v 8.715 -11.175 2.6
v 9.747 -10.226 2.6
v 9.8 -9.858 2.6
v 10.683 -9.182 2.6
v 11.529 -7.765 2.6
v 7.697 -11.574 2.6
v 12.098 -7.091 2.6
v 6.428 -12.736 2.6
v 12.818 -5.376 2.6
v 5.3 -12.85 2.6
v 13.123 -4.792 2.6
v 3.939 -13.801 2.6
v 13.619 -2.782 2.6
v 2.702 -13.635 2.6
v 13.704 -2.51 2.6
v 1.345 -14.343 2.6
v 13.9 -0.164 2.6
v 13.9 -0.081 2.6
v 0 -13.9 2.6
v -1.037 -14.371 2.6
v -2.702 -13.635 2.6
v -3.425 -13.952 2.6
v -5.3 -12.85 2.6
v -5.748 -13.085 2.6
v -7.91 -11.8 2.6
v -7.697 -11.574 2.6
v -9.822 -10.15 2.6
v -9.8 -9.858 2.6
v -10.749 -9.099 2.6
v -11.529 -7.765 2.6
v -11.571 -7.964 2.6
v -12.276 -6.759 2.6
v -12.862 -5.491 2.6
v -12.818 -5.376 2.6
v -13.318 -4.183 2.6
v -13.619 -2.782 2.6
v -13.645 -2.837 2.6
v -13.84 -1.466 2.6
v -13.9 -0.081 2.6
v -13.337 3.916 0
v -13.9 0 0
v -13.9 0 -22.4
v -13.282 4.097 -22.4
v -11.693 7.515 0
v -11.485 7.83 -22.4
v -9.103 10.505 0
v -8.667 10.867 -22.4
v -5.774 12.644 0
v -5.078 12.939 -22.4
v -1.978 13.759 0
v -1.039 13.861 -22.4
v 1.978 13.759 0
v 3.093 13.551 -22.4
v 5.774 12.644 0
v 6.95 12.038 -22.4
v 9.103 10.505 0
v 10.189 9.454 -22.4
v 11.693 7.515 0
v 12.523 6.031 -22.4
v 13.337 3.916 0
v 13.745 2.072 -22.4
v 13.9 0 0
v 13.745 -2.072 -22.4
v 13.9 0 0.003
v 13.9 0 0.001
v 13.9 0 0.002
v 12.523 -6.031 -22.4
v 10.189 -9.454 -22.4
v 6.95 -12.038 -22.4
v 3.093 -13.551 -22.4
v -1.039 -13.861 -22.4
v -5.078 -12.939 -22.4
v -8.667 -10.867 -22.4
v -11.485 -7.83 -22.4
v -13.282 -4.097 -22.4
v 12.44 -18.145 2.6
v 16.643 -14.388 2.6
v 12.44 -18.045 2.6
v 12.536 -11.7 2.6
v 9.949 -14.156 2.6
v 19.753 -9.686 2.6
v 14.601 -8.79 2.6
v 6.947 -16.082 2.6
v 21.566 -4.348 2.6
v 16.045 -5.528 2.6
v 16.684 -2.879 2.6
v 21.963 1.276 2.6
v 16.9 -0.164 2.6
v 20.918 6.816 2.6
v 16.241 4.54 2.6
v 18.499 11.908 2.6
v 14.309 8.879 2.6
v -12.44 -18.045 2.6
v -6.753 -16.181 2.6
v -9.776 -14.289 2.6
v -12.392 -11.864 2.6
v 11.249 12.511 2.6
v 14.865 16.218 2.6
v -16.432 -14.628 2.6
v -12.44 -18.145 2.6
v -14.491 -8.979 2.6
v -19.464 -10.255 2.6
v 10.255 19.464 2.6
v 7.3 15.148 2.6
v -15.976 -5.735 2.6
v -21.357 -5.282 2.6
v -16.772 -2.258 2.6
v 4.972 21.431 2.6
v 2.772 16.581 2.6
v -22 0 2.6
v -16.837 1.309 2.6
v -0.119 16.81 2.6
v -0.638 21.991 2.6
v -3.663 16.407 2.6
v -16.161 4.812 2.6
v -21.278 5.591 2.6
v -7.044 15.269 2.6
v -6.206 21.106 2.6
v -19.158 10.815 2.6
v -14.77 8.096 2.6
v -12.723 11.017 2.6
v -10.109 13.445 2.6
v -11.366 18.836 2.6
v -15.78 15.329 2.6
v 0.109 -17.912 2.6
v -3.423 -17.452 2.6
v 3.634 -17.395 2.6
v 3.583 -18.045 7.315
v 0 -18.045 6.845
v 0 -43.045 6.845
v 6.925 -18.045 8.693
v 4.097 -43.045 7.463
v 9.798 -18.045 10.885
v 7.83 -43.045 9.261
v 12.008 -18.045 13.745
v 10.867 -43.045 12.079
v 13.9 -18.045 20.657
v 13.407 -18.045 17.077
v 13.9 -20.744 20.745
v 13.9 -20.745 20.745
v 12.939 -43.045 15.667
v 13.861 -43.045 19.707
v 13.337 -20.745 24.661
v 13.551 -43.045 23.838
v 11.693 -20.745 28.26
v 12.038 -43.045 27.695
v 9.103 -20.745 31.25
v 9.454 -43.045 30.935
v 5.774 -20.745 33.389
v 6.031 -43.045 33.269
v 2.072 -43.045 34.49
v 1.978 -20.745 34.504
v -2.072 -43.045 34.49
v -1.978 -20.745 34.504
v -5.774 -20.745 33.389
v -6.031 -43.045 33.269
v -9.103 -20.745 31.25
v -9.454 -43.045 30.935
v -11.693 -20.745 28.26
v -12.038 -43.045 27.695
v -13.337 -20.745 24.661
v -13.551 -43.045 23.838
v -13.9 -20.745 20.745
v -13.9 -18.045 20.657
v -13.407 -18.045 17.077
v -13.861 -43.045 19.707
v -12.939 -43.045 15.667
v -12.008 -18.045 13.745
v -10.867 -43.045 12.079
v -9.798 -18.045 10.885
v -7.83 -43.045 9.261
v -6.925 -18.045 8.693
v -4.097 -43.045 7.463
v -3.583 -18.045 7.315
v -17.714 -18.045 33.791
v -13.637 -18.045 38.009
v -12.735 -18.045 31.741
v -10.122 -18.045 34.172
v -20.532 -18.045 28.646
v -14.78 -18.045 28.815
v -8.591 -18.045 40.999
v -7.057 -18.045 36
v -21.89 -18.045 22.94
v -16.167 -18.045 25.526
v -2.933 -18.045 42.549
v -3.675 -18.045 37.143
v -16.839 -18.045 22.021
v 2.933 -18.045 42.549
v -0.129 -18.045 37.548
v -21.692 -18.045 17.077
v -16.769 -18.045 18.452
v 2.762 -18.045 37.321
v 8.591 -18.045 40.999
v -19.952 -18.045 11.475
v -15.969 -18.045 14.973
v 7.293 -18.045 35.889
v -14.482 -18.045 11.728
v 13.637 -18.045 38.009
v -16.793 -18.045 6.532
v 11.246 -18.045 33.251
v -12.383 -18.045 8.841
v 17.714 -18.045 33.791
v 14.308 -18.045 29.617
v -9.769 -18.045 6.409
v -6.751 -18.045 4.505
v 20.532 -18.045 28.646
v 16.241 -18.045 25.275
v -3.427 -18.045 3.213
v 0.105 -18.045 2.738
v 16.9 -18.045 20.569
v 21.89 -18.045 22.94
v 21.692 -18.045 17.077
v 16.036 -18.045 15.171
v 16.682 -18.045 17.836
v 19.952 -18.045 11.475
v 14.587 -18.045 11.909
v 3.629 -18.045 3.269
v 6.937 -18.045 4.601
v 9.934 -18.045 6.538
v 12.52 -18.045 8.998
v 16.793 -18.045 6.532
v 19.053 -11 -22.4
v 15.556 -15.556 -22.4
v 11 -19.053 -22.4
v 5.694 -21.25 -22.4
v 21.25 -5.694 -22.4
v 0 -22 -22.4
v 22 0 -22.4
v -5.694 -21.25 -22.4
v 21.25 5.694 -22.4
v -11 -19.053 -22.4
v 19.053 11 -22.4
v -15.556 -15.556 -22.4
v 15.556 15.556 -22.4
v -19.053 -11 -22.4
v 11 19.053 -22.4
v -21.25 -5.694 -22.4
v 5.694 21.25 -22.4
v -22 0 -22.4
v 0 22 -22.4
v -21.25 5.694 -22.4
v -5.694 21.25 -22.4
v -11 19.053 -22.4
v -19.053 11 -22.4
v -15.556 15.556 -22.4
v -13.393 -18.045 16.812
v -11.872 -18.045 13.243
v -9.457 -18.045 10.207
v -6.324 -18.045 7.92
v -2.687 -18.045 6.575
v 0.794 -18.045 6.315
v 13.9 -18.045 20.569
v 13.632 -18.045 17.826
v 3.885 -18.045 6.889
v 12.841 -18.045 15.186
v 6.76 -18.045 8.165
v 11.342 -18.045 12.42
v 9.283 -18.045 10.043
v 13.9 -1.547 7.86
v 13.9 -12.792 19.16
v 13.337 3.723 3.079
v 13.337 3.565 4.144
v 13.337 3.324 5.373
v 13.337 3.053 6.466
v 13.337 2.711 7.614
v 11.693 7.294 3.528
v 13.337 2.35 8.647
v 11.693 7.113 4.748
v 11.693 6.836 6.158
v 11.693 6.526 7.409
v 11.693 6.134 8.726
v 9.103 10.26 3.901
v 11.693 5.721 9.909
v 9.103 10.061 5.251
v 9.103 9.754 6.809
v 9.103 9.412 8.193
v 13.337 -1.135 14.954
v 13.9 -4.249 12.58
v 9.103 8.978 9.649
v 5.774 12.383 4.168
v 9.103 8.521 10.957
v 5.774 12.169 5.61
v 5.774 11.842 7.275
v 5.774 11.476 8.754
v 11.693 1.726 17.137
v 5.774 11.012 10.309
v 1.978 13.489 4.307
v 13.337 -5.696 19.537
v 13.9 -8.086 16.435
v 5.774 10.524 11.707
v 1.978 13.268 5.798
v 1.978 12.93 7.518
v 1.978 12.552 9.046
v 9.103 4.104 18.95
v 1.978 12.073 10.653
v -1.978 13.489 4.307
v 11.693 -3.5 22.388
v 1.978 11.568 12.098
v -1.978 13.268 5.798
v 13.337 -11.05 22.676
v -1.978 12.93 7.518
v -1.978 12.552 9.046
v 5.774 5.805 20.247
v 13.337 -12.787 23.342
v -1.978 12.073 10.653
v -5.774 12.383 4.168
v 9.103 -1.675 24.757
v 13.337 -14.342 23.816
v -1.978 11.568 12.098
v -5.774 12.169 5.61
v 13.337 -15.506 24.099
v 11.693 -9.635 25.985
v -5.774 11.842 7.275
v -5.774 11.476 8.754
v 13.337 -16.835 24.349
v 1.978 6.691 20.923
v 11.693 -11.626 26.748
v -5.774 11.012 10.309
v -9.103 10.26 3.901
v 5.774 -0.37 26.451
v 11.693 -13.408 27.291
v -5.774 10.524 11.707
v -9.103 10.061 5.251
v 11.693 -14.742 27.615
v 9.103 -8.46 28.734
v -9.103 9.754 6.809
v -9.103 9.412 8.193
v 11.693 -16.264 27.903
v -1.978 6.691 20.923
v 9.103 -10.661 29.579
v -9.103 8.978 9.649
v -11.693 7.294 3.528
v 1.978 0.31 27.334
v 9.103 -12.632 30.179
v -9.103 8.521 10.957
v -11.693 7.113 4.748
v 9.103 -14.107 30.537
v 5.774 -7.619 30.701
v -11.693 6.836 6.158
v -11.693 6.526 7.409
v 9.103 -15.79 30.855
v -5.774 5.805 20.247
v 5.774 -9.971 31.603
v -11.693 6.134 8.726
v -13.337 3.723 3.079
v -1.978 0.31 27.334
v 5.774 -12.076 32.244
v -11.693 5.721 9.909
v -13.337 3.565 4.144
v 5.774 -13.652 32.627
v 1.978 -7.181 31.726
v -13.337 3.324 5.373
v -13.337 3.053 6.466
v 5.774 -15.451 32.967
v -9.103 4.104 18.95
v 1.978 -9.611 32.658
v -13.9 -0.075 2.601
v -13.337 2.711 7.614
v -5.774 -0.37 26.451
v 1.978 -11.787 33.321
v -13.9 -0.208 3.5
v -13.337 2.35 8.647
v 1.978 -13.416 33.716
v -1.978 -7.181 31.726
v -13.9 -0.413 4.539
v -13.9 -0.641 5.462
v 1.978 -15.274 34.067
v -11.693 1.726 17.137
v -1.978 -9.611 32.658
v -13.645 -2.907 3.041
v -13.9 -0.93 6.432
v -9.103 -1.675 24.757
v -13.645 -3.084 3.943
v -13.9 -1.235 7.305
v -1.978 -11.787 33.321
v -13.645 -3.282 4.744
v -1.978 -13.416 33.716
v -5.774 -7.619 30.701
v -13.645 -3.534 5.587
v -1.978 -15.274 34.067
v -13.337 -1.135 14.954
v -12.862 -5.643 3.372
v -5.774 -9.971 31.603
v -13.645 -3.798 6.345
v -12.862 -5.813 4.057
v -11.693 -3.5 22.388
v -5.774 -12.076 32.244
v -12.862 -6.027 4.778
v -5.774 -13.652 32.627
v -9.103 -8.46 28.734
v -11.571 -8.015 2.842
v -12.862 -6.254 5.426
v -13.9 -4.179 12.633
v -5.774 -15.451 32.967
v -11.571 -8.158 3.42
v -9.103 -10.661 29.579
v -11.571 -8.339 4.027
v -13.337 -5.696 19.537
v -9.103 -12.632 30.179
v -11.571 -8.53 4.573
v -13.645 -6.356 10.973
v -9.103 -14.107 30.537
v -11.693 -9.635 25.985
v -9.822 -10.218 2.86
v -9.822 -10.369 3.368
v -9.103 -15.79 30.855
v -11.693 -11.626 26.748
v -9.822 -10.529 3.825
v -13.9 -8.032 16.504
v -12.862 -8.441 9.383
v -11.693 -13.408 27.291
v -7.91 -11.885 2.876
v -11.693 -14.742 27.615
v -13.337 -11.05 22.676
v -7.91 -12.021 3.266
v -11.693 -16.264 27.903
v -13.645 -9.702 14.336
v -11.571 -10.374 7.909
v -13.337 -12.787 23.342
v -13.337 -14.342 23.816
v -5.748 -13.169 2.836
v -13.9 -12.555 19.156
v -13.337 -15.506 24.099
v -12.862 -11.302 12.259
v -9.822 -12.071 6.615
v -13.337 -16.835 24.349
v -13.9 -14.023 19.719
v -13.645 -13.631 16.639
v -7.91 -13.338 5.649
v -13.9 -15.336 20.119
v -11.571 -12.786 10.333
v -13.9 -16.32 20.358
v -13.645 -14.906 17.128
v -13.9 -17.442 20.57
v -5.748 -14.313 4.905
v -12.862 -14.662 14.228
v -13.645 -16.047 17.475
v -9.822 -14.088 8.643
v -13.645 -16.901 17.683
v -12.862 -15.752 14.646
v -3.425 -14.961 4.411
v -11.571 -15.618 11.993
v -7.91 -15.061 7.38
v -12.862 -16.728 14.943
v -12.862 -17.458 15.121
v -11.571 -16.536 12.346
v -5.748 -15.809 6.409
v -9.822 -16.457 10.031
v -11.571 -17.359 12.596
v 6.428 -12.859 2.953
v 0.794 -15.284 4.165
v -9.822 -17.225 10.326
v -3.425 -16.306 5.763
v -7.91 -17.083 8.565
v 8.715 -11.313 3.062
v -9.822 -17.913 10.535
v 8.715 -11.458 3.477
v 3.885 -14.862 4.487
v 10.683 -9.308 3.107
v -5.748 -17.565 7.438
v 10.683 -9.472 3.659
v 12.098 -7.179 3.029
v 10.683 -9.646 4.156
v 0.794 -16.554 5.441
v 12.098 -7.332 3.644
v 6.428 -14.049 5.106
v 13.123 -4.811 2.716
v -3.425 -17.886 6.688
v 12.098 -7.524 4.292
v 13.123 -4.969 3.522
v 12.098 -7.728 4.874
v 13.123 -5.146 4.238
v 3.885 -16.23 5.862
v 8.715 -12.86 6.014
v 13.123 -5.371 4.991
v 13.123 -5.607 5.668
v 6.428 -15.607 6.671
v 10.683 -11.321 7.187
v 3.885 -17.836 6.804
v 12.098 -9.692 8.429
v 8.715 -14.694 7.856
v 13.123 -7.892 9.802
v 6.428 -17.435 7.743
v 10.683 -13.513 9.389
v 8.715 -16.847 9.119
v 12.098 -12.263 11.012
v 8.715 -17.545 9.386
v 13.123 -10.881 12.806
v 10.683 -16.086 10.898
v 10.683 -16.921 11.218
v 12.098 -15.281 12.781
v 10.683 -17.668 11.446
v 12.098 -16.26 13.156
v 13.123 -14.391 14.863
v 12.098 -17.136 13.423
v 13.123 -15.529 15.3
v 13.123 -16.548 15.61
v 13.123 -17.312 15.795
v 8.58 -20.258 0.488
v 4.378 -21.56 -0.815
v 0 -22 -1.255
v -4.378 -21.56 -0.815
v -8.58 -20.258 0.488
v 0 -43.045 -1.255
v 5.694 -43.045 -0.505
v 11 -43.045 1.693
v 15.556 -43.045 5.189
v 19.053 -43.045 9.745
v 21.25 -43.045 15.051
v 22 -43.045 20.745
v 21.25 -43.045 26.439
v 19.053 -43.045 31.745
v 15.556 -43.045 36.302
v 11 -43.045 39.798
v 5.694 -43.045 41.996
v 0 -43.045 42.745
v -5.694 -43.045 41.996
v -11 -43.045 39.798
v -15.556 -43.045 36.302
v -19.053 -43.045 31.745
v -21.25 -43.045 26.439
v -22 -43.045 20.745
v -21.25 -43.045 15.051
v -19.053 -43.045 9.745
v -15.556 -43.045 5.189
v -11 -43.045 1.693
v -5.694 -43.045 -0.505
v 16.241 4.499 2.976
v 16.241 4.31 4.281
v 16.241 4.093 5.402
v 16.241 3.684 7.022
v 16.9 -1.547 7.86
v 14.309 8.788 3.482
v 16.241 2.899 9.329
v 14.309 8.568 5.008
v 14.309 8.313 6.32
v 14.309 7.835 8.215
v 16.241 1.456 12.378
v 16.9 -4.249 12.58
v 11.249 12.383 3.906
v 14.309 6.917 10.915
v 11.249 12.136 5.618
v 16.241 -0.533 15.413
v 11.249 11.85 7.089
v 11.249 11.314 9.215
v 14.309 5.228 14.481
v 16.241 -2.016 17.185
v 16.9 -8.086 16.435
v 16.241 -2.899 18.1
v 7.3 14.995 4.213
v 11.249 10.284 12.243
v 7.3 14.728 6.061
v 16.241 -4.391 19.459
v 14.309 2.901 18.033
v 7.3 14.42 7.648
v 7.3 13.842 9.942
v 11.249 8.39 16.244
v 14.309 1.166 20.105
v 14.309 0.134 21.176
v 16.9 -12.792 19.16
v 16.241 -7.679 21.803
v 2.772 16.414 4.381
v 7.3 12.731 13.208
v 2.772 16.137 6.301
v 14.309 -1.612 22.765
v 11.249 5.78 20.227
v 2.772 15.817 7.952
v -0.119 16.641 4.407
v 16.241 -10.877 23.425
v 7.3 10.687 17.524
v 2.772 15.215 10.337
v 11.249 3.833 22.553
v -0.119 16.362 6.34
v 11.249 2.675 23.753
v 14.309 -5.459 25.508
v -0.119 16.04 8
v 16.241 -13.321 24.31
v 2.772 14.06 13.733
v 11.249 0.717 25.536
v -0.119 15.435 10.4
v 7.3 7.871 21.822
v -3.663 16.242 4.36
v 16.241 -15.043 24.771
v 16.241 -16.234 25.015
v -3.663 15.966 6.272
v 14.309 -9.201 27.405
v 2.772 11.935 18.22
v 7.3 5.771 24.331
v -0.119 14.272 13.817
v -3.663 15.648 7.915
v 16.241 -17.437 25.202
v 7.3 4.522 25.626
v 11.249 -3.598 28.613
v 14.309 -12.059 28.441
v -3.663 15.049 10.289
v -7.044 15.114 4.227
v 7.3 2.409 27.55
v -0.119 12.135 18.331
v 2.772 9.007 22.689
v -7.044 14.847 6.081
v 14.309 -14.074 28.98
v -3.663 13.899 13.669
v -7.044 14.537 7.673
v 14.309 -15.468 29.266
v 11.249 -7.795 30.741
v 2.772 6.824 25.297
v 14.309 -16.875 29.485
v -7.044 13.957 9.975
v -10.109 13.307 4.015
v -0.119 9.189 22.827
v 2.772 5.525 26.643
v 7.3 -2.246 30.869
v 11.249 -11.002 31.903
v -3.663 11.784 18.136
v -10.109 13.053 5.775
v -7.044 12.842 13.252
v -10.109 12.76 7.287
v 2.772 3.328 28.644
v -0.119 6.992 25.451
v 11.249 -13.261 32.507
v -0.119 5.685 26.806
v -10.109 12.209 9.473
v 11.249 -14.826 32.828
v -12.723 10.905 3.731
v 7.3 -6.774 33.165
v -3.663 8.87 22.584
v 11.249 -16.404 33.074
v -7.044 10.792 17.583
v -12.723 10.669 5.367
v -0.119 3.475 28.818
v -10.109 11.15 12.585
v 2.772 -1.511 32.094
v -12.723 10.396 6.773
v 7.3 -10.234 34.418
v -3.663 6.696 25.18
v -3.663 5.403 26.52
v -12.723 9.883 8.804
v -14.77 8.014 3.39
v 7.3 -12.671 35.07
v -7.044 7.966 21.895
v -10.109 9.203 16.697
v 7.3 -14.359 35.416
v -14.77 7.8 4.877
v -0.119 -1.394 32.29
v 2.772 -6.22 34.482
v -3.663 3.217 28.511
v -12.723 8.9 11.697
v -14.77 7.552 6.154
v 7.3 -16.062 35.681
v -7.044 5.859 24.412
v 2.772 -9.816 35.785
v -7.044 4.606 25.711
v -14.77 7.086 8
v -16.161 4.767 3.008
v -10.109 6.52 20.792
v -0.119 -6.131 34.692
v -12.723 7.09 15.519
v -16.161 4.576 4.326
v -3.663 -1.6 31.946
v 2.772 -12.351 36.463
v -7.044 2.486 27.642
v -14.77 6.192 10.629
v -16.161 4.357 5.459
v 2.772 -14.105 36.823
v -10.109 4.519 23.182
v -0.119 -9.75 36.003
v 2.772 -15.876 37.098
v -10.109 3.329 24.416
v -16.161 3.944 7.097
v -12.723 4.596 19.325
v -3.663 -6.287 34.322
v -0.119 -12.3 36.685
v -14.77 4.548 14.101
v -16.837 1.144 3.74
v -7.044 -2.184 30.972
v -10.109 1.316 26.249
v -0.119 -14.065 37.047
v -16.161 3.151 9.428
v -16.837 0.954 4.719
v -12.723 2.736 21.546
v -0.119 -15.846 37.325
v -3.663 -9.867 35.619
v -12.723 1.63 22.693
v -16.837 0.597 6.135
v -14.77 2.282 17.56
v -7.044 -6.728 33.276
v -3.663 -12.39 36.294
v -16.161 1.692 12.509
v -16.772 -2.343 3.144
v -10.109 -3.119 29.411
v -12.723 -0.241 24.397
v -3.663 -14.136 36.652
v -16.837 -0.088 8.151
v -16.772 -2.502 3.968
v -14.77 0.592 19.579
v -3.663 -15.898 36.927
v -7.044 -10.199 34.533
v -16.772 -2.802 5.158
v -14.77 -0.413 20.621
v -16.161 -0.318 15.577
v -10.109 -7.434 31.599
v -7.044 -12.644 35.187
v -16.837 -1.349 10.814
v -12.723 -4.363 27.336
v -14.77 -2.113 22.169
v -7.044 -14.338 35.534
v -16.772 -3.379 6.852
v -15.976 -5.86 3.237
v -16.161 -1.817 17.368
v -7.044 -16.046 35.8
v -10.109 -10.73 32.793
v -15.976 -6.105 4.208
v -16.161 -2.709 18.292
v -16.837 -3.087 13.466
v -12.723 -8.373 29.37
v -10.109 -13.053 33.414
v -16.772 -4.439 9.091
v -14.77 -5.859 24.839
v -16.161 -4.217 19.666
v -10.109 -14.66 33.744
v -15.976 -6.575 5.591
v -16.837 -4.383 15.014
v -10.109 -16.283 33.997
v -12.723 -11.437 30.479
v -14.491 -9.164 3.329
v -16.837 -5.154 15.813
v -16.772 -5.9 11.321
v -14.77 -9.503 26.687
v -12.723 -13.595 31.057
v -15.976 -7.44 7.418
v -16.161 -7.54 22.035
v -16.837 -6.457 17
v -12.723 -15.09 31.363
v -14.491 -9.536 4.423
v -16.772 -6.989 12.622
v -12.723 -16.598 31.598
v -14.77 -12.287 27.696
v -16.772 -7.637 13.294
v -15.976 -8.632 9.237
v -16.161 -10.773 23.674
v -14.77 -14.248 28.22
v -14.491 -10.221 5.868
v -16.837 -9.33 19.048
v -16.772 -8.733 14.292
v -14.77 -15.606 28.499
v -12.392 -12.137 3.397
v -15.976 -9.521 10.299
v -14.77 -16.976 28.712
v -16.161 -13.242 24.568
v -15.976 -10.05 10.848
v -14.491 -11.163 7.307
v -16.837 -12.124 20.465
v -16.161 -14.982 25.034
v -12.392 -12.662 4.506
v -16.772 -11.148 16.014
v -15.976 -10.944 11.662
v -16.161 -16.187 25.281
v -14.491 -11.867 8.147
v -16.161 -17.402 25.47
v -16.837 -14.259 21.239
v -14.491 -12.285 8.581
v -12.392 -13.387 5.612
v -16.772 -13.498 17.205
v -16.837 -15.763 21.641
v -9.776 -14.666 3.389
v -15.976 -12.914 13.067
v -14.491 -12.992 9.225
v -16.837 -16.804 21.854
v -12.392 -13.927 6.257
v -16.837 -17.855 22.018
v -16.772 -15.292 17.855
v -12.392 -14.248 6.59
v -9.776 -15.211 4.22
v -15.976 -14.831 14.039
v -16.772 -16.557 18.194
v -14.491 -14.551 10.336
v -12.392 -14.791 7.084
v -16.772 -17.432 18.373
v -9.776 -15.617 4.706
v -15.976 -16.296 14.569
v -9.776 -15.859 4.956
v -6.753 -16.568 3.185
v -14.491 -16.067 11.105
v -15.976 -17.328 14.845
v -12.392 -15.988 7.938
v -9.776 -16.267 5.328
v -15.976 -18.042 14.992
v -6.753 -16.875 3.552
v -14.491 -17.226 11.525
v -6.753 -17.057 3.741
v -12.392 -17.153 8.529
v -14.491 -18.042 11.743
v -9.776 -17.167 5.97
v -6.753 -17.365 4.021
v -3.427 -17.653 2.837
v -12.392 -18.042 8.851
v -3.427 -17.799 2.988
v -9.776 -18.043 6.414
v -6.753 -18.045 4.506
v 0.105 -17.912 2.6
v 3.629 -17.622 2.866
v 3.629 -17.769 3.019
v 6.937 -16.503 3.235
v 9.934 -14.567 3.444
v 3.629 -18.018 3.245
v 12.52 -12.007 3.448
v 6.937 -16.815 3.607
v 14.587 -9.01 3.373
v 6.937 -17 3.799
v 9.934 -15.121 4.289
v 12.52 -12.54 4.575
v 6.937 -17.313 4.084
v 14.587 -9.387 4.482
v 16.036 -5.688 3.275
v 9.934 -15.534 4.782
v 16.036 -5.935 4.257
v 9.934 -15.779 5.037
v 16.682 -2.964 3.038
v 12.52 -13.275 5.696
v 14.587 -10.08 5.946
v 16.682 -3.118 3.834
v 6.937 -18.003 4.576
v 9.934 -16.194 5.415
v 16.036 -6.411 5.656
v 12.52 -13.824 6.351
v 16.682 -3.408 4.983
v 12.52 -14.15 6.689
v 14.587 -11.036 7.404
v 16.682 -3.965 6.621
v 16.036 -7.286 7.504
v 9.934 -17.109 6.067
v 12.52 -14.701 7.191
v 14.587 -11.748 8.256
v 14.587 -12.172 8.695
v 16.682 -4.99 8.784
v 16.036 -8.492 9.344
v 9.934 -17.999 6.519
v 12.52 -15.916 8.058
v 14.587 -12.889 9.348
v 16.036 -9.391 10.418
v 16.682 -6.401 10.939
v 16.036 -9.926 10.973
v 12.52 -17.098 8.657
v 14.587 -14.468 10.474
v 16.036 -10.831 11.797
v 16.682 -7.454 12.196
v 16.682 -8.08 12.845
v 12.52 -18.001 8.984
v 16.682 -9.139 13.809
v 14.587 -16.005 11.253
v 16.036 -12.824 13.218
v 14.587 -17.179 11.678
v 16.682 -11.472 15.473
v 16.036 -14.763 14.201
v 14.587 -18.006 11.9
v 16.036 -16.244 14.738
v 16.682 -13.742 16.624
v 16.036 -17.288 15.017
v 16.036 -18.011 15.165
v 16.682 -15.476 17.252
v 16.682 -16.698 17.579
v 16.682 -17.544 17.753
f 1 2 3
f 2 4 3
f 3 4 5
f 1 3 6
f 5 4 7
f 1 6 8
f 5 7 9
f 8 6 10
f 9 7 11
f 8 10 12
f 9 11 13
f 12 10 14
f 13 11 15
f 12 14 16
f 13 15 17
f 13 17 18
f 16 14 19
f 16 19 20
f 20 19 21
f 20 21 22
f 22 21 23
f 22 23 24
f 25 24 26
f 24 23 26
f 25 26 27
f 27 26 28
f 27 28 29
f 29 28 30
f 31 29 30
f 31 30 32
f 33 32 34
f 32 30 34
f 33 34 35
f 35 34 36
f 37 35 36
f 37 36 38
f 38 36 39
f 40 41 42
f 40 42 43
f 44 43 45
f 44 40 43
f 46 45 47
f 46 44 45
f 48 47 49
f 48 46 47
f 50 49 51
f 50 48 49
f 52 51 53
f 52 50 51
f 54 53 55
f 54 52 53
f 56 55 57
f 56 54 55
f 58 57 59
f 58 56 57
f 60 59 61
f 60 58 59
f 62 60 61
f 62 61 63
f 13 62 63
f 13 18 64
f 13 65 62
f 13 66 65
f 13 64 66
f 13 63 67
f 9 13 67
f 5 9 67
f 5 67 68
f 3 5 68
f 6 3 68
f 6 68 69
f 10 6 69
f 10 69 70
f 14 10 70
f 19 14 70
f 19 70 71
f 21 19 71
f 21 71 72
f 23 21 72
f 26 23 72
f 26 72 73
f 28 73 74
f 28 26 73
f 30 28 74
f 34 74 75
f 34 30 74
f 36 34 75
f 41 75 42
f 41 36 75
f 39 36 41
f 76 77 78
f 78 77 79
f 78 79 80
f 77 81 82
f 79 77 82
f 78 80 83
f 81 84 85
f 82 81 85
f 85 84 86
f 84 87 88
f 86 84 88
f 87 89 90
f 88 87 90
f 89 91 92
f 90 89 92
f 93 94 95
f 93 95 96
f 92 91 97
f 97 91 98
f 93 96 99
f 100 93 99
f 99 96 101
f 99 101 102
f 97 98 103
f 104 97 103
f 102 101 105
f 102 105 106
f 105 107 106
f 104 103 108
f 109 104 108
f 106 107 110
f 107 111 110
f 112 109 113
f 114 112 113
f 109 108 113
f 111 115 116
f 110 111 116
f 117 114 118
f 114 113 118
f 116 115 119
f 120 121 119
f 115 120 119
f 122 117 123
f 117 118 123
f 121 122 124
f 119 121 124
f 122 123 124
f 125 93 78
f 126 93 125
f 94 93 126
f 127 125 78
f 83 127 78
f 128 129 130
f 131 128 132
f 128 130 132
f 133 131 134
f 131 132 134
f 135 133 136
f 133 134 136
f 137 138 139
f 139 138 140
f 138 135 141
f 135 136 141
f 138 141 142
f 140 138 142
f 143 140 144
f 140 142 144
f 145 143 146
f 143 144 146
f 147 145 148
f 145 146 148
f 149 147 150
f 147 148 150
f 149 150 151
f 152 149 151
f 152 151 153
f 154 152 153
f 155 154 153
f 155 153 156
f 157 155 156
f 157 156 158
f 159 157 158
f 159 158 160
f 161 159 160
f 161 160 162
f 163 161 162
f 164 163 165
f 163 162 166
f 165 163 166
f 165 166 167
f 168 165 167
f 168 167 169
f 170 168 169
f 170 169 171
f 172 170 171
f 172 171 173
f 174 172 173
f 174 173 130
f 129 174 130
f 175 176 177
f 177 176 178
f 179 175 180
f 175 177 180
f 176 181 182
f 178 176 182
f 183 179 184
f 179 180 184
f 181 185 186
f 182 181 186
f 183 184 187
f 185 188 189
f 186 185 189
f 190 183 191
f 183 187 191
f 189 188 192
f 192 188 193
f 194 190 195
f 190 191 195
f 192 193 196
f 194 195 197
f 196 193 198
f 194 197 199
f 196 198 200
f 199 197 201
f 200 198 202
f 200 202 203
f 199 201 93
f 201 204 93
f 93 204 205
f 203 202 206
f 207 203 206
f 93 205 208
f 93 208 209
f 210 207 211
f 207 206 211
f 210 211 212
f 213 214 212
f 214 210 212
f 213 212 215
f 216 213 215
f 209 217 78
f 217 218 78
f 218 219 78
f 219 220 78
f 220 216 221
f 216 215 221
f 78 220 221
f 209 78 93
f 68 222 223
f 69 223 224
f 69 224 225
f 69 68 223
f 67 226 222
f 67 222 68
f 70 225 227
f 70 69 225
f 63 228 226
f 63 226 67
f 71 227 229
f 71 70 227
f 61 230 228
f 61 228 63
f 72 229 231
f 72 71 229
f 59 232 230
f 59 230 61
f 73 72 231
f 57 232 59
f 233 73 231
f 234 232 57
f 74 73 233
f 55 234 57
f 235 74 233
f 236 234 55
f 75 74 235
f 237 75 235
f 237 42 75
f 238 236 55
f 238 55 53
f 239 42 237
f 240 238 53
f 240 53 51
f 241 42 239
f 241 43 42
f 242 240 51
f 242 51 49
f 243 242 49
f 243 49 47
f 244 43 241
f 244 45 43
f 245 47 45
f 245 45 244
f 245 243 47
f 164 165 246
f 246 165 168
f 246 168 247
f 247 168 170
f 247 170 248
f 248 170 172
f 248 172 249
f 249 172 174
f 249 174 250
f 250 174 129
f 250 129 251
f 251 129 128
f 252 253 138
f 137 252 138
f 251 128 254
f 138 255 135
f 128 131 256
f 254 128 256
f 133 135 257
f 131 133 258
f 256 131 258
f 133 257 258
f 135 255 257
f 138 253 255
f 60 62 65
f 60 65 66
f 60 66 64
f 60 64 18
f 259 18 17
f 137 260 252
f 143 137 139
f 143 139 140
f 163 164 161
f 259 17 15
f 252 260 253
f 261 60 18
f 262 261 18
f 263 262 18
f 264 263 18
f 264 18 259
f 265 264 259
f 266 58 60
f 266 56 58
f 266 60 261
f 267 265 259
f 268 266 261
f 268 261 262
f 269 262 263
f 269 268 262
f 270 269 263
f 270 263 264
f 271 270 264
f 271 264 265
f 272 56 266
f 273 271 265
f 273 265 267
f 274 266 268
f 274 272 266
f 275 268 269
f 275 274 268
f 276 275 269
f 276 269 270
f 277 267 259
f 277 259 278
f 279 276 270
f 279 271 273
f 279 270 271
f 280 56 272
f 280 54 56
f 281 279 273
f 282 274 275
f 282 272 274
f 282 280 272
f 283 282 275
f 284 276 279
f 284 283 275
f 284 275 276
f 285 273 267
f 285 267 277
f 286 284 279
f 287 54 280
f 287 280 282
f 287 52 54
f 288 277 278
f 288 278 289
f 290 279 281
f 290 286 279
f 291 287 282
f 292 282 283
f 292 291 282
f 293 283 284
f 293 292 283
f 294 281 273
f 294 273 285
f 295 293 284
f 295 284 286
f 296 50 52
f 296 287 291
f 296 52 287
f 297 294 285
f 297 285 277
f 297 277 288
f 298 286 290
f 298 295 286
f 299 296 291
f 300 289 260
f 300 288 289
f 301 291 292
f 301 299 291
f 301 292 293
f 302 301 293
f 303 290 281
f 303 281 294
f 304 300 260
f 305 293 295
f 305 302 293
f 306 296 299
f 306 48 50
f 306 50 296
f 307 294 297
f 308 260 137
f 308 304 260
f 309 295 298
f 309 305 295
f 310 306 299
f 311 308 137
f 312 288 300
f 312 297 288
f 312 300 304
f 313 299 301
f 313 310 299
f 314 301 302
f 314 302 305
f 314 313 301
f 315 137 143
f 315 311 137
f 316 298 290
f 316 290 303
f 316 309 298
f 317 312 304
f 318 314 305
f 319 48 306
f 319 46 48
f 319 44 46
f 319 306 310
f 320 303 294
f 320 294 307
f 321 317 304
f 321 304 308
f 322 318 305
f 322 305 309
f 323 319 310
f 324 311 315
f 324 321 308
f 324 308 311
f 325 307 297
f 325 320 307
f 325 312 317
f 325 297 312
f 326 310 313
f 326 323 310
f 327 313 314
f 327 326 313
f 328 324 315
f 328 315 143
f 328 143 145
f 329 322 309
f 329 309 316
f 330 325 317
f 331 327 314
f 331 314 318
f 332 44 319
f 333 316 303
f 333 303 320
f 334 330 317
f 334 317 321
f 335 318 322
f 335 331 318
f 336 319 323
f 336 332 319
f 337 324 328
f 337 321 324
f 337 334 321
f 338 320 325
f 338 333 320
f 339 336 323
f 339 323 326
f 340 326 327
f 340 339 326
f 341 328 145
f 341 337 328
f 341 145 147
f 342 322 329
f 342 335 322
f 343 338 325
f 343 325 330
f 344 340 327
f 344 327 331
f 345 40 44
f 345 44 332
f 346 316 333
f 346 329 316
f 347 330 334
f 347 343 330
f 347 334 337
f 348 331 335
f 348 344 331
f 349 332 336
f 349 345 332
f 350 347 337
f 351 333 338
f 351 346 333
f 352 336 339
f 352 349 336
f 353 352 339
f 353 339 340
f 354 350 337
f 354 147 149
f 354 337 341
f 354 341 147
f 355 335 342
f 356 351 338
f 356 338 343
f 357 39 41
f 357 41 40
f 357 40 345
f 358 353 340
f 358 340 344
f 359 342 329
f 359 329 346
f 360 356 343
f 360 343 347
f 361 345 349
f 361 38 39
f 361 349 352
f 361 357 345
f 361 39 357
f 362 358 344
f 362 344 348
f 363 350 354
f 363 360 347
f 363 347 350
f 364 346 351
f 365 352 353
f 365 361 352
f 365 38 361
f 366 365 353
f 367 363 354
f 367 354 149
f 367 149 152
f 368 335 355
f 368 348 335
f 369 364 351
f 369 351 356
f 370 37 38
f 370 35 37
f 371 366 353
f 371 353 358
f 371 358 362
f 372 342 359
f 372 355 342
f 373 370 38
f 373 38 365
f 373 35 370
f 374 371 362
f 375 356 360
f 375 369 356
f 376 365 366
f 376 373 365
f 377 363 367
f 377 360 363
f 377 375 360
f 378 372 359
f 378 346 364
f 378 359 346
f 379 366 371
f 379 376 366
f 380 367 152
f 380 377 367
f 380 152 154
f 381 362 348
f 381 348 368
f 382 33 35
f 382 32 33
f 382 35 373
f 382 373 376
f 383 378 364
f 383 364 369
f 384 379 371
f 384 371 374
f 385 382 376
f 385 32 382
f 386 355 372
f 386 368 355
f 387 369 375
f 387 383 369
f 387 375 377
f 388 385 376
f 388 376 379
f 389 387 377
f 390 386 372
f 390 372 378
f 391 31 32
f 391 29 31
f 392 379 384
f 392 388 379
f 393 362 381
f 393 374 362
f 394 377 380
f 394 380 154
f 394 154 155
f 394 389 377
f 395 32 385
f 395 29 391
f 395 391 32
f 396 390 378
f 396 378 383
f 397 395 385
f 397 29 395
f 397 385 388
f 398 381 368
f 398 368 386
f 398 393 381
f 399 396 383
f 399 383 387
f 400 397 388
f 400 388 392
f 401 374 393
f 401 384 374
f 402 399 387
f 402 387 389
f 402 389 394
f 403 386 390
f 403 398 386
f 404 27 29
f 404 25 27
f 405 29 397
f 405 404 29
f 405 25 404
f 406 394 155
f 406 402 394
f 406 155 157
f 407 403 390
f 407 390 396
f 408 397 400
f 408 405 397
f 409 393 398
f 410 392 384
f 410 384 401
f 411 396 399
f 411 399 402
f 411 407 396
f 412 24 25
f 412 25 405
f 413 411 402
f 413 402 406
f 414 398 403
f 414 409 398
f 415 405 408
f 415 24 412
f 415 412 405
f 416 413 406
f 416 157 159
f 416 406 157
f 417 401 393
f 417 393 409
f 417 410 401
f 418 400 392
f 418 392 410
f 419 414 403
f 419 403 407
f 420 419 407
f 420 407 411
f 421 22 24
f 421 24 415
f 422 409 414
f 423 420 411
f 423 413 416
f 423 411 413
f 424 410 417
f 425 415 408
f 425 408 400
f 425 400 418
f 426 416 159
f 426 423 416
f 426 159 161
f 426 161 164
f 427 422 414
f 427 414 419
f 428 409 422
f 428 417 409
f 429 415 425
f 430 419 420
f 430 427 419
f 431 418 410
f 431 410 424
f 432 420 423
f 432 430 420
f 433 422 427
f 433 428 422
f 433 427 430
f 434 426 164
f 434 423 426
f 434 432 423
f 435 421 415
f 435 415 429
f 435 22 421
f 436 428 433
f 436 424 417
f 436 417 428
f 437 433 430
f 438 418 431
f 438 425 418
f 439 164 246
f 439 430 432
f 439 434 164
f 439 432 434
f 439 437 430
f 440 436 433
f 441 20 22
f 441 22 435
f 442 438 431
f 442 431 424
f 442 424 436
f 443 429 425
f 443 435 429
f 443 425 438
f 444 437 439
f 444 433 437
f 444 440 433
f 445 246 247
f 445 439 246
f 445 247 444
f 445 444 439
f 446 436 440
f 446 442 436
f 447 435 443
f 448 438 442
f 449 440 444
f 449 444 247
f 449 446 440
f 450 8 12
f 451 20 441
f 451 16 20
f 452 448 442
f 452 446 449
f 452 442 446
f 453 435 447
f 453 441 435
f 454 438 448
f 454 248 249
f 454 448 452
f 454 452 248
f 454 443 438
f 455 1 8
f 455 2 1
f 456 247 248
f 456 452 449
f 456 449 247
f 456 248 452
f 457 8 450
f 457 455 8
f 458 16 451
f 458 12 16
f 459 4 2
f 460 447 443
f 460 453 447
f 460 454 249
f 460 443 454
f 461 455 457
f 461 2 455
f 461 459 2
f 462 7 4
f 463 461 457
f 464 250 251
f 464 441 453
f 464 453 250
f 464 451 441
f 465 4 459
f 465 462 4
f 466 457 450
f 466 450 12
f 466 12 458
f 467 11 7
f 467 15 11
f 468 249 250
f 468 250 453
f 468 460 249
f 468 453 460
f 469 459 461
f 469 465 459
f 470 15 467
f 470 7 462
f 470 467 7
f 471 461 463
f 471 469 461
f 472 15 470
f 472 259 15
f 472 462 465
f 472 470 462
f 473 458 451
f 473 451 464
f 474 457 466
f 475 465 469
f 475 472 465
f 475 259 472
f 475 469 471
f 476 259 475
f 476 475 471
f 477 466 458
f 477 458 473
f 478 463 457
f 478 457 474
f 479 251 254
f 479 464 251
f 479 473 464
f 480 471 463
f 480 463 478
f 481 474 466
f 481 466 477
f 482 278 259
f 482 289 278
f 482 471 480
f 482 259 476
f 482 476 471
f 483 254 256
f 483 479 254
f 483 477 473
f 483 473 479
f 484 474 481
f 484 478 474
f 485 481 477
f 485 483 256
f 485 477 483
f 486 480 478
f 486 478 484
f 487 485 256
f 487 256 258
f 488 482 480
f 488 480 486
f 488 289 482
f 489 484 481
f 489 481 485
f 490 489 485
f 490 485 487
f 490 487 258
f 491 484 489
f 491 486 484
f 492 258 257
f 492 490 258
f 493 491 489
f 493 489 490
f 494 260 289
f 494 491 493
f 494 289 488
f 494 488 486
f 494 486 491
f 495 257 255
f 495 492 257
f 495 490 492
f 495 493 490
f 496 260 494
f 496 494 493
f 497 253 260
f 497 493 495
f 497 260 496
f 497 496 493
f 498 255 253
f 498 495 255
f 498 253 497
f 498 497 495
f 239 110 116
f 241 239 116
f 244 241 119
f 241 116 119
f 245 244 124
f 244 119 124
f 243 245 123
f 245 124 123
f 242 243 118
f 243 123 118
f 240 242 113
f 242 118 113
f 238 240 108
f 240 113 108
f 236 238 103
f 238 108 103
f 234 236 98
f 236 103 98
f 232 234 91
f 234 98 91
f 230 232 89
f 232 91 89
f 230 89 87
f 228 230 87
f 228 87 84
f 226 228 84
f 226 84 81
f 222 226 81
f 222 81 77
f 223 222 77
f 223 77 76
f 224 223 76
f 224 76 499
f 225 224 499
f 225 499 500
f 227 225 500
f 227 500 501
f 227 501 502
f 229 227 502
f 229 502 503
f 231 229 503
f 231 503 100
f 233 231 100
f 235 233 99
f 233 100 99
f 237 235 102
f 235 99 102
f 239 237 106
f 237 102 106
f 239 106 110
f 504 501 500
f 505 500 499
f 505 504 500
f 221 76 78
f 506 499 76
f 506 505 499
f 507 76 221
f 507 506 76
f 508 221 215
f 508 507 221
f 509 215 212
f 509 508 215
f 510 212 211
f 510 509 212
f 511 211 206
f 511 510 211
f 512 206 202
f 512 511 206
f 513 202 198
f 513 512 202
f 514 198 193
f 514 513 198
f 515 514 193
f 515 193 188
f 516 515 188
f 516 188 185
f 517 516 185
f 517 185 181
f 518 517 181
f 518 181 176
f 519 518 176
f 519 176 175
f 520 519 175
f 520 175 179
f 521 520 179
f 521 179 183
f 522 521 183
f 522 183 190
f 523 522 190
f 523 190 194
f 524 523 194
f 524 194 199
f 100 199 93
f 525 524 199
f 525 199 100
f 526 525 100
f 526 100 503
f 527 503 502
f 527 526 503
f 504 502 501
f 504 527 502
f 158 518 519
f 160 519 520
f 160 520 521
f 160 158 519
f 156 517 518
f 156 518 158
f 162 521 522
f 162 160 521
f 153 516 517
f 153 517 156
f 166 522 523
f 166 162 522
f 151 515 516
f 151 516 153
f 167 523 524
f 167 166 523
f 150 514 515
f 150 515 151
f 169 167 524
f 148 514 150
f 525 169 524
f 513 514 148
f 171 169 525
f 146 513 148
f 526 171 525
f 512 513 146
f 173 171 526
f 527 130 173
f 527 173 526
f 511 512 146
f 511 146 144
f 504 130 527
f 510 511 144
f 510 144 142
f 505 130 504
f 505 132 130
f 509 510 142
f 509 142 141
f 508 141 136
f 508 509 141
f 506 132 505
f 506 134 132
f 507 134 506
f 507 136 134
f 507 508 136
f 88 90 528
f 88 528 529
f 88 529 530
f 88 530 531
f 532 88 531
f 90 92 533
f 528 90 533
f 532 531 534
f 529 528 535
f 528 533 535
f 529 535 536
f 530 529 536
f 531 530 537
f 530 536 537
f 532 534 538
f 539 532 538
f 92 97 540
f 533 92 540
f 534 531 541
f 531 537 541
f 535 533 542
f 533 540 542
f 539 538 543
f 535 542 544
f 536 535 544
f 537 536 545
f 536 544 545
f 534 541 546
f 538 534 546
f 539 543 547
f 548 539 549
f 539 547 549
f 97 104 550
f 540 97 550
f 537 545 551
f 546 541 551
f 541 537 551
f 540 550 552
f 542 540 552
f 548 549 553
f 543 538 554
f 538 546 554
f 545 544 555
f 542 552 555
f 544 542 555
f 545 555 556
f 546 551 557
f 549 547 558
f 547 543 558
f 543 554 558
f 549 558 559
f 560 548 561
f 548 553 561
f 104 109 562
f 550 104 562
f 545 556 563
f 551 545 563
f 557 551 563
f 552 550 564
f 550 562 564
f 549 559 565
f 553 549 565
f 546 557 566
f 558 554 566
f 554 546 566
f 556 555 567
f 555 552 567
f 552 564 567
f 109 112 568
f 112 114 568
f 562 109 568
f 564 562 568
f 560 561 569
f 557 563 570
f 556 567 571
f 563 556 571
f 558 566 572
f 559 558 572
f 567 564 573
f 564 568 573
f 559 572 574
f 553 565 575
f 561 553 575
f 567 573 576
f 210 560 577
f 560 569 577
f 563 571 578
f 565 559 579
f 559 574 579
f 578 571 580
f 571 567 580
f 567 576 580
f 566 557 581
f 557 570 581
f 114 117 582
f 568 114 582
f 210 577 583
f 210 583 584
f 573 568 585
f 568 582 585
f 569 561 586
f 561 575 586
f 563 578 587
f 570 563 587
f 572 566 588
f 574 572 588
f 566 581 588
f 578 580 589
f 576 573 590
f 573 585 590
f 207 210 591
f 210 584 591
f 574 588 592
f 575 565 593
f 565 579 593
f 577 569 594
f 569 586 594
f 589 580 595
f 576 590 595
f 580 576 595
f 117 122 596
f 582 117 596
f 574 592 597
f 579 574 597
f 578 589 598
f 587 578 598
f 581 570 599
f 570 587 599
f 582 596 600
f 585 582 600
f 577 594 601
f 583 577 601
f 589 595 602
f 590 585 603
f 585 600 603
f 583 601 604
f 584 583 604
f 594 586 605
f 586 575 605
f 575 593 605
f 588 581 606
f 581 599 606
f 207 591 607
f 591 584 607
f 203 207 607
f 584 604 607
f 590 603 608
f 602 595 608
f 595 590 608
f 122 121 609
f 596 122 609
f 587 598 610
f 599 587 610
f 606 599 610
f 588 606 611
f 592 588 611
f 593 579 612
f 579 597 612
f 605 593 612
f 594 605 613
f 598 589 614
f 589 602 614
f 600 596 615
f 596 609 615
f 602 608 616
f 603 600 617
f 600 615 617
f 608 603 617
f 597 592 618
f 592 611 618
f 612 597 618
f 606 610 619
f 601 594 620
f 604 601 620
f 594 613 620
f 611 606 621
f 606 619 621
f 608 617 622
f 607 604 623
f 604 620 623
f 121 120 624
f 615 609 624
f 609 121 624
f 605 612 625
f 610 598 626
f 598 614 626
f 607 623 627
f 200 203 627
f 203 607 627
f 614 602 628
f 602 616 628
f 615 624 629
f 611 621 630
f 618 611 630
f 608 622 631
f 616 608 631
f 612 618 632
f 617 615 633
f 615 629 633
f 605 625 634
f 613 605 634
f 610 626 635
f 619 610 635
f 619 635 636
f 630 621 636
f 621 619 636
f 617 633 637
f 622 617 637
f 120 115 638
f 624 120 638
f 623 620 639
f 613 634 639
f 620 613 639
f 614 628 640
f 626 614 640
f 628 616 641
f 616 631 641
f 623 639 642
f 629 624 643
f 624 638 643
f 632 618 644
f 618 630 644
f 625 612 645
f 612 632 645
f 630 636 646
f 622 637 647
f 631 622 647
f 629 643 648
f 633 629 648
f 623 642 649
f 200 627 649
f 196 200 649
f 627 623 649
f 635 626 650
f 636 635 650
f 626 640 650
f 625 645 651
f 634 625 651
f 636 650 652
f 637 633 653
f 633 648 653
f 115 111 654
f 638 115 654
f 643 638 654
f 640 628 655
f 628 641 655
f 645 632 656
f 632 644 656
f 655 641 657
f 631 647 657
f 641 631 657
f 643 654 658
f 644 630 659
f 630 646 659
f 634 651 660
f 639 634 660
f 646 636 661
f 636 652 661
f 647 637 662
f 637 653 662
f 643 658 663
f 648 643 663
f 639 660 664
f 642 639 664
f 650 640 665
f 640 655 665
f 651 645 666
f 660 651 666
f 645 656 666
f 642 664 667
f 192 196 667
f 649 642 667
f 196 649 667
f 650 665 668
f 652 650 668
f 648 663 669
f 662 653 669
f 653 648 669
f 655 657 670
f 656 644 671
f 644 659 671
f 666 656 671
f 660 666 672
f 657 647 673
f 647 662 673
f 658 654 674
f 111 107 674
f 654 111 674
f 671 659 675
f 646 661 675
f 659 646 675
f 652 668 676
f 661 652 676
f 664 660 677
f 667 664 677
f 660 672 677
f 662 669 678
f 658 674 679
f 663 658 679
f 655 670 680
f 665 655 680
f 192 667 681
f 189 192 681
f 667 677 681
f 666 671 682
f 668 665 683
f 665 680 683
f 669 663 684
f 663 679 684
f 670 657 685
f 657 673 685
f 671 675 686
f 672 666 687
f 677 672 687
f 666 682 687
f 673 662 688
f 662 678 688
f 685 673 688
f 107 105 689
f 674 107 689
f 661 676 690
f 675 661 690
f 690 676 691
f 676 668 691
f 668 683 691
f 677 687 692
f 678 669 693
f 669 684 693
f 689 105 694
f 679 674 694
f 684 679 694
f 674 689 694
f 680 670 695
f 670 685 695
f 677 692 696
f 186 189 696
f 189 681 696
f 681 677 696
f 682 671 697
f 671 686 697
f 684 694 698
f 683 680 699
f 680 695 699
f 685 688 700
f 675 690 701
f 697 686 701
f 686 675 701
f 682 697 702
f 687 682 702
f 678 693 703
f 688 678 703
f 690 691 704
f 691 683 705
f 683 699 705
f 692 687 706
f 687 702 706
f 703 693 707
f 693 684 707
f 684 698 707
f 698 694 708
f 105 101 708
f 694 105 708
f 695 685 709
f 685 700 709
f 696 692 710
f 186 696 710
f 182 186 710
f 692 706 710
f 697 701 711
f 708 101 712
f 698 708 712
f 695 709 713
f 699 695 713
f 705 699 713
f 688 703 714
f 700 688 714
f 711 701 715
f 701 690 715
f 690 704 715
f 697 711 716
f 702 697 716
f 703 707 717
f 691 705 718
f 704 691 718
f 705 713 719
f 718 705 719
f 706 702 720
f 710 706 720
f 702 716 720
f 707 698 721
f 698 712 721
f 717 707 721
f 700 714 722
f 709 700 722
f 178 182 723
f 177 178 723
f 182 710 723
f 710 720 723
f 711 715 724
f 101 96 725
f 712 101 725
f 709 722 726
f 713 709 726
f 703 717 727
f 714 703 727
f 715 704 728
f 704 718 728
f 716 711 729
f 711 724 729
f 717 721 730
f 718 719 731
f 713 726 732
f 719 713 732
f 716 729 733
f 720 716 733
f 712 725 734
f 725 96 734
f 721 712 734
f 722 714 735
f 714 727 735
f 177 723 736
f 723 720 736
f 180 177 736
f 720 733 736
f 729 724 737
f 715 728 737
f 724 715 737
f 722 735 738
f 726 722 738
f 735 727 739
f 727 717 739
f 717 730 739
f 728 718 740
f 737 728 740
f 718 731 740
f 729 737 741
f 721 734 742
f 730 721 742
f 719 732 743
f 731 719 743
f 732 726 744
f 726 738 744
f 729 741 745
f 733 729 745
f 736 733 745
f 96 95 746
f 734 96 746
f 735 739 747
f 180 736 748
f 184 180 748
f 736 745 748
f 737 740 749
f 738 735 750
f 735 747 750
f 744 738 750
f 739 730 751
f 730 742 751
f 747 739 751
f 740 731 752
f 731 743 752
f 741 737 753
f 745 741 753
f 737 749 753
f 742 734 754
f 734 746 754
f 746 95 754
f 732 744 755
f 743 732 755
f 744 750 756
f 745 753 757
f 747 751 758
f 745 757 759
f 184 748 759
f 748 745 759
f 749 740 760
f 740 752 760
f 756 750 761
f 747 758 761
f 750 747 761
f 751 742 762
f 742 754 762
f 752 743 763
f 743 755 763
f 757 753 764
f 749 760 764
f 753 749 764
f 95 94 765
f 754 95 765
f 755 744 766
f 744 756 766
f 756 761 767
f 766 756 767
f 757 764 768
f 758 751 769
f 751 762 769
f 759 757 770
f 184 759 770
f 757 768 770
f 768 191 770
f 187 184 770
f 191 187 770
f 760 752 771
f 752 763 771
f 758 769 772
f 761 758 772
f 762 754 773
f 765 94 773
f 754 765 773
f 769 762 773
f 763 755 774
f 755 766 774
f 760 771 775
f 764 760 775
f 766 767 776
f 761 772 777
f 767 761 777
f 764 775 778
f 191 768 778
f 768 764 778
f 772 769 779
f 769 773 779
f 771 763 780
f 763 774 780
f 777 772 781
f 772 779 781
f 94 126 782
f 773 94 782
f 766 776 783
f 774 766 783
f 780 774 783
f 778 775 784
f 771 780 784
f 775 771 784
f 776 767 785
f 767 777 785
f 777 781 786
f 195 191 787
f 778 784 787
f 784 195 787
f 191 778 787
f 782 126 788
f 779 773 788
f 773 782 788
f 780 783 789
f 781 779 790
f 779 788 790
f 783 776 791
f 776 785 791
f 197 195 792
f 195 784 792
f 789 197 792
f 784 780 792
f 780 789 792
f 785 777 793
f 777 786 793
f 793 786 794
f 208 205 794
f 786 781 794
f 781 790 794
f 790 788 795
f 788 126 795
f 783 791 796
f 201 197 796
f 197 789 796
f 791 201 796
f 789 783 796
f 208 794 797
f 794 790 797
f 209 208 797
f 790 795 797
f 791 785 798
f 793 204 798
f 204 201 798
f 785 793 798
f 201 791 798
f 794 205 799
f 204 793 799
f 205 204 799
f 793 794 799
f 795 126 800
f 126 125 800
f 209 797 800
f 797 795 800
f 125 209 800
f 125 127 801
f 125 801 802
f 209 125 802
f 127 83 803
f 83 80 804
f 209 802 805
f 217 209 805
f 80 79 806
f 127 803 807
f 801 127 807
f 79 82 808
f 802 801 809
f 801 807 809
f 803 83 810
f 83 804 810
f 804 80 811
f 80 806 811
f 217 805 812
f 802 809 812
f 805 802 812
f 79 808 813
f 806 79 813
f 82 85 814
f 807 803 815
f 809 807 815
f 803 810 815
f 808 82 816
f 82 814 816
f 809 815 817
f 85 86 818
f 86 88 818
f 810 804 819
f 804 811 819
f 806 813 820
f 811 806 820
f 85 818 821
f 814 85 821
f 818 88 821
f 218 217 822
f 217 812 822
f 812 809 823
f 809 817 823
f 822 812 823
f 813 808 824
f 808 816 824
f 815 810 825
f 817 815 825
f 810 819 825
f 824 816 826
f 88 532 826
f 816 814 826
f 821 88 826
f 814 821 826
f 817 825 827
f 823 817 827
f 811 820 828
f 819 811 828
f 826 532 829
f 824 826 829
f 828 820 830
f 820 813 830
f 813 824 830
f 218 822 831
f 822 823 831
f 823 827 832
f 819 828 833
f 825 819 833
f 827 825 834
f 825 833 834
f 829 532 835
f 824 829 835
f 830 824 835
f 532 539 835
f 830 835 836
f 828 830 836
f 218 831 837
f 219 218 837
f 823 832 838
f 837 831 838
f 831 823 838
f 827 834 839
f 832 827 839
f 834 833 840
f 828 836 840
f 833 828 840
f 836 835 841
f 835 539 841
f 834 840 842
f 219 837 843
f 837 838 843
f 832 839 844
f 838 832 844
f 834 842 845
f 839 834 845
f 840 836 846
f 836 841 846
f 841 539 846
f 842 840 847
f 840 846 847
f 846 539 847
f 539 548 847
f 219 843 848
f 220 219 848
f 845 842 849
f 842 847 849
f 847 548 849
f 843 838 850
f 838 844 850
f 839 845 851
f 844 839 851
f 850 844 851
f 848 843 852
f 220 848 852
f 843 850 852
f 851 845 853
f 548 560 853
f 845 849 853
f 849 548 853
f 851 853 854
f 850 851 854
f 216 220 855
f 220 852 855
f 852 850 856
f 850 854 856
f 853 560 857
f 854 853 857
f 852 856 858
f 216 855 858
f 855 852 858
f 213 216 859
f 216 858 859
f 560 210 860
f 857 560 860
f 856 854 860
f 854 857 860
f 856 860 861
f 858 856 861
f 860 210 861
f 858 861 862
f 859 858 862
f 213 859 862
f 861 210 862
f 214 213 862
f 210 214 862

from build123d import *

# Parameters (mm, degrees)
ESQUISSE1_R             = 16.9
ESQUISSE1_R_2           = 13.9
R_VOL_MINCE1_ANGLE      = 90
ESQUISSE2_R             = 15.9
ESQUISSE2_R_2           = 13.9
EXTRU_MINCE1_DEPTH      = 22.4
ESQUISSE3_R             = 18.1
ESQUISSE3_R_2           = 16.1
EXTRU_MINCE2_DEPTH      = 22.3
CROQUIS1_R              = 22
CROQUIS1_R_2            = 13.9
SALIENTE_EXTRUIR1_DEPTH = 25
SALIENTE_EXTRUIR2_START = -25
CROQUIS2_R              = 22
CROQUIS2_R_2            = 13.9
SALIENTE_EXTRUIR2_DEPTH = 25


with BuildPart() as part:
    # Esquisse1 → Révol.-Mince1 (revolve)
    with BuildSketch(Plane.XY):
        Circle(ESQUISSE1_R)
        Circle(ESQUISSE1_R_2, mode=Mode.SUBTRACT)
    revolve(axis=Axis((0, -20.745281933, 0), (1, 0, 0)), revolution_arc=R_VOL_MINCE1_ANGLE)

    # Esquisse2 → Extru.-Mince1 (add)
    with BuildSketch(Plane(origin=(0, 0, 0), x_dir=(-1, 0, 0), z_dir=(0, 0, -1))):
        Circle(ESQUISSE2_R)
        Circle(ESQUISSE2_R_2, mode=Mode.SUBTRACT)
    extrude(amount=EXTRU_MINCE1_DEPTH)

    # Esquisse3 → Extru.-Mince2 (add)
    with BuildSketch(Plane.XZ.offset(20.745281933)):
        with Locations((0, 20.745281933)):
            Circle(ESQUISSE3_R)
        with Locations((0, 20.745281933)):
            Circle(ESQUISSE3_R_2, mode=Mode.SUBTRACT)
    extrude(amount=EXTRU_MINCE2_DEPTH)

    # Croquis1 → Saliente-Extruir1 (add)
    with BuildSketch(Plane.XZ.offset(43.045281933)):
        with Locations(Location((0, 20.745281933, 0), (0, 0, 270))):
            Circle(CROQUIS1_R)
        with Locations(Location((0, 20.745281933, 0), (0, 0, 270))):
            Circle(CROQUIS1_R_2, mode=Mode.SUBTRACT)
    extrude(amount=-SALIENTE_EXTRUIR1_DEPTH)

    # Croquis2 → Saliente-Extruir2 (add)
    with BuildSketch(Plane(origin=(0, 0, -22.4), x_dir=(-1, 0, 0), z_dir=(0, 0, -1)).offset(SALIENTE_EXTRUIR2_START)):
        Circle(CROQUIS2_R)
        Circle(CROQUIS2_R_2, mode=Mode.SUBTRACT)
    extrude(amount=SALIENTE_EXTRUIR2_DEPTH)


solid = part.part
